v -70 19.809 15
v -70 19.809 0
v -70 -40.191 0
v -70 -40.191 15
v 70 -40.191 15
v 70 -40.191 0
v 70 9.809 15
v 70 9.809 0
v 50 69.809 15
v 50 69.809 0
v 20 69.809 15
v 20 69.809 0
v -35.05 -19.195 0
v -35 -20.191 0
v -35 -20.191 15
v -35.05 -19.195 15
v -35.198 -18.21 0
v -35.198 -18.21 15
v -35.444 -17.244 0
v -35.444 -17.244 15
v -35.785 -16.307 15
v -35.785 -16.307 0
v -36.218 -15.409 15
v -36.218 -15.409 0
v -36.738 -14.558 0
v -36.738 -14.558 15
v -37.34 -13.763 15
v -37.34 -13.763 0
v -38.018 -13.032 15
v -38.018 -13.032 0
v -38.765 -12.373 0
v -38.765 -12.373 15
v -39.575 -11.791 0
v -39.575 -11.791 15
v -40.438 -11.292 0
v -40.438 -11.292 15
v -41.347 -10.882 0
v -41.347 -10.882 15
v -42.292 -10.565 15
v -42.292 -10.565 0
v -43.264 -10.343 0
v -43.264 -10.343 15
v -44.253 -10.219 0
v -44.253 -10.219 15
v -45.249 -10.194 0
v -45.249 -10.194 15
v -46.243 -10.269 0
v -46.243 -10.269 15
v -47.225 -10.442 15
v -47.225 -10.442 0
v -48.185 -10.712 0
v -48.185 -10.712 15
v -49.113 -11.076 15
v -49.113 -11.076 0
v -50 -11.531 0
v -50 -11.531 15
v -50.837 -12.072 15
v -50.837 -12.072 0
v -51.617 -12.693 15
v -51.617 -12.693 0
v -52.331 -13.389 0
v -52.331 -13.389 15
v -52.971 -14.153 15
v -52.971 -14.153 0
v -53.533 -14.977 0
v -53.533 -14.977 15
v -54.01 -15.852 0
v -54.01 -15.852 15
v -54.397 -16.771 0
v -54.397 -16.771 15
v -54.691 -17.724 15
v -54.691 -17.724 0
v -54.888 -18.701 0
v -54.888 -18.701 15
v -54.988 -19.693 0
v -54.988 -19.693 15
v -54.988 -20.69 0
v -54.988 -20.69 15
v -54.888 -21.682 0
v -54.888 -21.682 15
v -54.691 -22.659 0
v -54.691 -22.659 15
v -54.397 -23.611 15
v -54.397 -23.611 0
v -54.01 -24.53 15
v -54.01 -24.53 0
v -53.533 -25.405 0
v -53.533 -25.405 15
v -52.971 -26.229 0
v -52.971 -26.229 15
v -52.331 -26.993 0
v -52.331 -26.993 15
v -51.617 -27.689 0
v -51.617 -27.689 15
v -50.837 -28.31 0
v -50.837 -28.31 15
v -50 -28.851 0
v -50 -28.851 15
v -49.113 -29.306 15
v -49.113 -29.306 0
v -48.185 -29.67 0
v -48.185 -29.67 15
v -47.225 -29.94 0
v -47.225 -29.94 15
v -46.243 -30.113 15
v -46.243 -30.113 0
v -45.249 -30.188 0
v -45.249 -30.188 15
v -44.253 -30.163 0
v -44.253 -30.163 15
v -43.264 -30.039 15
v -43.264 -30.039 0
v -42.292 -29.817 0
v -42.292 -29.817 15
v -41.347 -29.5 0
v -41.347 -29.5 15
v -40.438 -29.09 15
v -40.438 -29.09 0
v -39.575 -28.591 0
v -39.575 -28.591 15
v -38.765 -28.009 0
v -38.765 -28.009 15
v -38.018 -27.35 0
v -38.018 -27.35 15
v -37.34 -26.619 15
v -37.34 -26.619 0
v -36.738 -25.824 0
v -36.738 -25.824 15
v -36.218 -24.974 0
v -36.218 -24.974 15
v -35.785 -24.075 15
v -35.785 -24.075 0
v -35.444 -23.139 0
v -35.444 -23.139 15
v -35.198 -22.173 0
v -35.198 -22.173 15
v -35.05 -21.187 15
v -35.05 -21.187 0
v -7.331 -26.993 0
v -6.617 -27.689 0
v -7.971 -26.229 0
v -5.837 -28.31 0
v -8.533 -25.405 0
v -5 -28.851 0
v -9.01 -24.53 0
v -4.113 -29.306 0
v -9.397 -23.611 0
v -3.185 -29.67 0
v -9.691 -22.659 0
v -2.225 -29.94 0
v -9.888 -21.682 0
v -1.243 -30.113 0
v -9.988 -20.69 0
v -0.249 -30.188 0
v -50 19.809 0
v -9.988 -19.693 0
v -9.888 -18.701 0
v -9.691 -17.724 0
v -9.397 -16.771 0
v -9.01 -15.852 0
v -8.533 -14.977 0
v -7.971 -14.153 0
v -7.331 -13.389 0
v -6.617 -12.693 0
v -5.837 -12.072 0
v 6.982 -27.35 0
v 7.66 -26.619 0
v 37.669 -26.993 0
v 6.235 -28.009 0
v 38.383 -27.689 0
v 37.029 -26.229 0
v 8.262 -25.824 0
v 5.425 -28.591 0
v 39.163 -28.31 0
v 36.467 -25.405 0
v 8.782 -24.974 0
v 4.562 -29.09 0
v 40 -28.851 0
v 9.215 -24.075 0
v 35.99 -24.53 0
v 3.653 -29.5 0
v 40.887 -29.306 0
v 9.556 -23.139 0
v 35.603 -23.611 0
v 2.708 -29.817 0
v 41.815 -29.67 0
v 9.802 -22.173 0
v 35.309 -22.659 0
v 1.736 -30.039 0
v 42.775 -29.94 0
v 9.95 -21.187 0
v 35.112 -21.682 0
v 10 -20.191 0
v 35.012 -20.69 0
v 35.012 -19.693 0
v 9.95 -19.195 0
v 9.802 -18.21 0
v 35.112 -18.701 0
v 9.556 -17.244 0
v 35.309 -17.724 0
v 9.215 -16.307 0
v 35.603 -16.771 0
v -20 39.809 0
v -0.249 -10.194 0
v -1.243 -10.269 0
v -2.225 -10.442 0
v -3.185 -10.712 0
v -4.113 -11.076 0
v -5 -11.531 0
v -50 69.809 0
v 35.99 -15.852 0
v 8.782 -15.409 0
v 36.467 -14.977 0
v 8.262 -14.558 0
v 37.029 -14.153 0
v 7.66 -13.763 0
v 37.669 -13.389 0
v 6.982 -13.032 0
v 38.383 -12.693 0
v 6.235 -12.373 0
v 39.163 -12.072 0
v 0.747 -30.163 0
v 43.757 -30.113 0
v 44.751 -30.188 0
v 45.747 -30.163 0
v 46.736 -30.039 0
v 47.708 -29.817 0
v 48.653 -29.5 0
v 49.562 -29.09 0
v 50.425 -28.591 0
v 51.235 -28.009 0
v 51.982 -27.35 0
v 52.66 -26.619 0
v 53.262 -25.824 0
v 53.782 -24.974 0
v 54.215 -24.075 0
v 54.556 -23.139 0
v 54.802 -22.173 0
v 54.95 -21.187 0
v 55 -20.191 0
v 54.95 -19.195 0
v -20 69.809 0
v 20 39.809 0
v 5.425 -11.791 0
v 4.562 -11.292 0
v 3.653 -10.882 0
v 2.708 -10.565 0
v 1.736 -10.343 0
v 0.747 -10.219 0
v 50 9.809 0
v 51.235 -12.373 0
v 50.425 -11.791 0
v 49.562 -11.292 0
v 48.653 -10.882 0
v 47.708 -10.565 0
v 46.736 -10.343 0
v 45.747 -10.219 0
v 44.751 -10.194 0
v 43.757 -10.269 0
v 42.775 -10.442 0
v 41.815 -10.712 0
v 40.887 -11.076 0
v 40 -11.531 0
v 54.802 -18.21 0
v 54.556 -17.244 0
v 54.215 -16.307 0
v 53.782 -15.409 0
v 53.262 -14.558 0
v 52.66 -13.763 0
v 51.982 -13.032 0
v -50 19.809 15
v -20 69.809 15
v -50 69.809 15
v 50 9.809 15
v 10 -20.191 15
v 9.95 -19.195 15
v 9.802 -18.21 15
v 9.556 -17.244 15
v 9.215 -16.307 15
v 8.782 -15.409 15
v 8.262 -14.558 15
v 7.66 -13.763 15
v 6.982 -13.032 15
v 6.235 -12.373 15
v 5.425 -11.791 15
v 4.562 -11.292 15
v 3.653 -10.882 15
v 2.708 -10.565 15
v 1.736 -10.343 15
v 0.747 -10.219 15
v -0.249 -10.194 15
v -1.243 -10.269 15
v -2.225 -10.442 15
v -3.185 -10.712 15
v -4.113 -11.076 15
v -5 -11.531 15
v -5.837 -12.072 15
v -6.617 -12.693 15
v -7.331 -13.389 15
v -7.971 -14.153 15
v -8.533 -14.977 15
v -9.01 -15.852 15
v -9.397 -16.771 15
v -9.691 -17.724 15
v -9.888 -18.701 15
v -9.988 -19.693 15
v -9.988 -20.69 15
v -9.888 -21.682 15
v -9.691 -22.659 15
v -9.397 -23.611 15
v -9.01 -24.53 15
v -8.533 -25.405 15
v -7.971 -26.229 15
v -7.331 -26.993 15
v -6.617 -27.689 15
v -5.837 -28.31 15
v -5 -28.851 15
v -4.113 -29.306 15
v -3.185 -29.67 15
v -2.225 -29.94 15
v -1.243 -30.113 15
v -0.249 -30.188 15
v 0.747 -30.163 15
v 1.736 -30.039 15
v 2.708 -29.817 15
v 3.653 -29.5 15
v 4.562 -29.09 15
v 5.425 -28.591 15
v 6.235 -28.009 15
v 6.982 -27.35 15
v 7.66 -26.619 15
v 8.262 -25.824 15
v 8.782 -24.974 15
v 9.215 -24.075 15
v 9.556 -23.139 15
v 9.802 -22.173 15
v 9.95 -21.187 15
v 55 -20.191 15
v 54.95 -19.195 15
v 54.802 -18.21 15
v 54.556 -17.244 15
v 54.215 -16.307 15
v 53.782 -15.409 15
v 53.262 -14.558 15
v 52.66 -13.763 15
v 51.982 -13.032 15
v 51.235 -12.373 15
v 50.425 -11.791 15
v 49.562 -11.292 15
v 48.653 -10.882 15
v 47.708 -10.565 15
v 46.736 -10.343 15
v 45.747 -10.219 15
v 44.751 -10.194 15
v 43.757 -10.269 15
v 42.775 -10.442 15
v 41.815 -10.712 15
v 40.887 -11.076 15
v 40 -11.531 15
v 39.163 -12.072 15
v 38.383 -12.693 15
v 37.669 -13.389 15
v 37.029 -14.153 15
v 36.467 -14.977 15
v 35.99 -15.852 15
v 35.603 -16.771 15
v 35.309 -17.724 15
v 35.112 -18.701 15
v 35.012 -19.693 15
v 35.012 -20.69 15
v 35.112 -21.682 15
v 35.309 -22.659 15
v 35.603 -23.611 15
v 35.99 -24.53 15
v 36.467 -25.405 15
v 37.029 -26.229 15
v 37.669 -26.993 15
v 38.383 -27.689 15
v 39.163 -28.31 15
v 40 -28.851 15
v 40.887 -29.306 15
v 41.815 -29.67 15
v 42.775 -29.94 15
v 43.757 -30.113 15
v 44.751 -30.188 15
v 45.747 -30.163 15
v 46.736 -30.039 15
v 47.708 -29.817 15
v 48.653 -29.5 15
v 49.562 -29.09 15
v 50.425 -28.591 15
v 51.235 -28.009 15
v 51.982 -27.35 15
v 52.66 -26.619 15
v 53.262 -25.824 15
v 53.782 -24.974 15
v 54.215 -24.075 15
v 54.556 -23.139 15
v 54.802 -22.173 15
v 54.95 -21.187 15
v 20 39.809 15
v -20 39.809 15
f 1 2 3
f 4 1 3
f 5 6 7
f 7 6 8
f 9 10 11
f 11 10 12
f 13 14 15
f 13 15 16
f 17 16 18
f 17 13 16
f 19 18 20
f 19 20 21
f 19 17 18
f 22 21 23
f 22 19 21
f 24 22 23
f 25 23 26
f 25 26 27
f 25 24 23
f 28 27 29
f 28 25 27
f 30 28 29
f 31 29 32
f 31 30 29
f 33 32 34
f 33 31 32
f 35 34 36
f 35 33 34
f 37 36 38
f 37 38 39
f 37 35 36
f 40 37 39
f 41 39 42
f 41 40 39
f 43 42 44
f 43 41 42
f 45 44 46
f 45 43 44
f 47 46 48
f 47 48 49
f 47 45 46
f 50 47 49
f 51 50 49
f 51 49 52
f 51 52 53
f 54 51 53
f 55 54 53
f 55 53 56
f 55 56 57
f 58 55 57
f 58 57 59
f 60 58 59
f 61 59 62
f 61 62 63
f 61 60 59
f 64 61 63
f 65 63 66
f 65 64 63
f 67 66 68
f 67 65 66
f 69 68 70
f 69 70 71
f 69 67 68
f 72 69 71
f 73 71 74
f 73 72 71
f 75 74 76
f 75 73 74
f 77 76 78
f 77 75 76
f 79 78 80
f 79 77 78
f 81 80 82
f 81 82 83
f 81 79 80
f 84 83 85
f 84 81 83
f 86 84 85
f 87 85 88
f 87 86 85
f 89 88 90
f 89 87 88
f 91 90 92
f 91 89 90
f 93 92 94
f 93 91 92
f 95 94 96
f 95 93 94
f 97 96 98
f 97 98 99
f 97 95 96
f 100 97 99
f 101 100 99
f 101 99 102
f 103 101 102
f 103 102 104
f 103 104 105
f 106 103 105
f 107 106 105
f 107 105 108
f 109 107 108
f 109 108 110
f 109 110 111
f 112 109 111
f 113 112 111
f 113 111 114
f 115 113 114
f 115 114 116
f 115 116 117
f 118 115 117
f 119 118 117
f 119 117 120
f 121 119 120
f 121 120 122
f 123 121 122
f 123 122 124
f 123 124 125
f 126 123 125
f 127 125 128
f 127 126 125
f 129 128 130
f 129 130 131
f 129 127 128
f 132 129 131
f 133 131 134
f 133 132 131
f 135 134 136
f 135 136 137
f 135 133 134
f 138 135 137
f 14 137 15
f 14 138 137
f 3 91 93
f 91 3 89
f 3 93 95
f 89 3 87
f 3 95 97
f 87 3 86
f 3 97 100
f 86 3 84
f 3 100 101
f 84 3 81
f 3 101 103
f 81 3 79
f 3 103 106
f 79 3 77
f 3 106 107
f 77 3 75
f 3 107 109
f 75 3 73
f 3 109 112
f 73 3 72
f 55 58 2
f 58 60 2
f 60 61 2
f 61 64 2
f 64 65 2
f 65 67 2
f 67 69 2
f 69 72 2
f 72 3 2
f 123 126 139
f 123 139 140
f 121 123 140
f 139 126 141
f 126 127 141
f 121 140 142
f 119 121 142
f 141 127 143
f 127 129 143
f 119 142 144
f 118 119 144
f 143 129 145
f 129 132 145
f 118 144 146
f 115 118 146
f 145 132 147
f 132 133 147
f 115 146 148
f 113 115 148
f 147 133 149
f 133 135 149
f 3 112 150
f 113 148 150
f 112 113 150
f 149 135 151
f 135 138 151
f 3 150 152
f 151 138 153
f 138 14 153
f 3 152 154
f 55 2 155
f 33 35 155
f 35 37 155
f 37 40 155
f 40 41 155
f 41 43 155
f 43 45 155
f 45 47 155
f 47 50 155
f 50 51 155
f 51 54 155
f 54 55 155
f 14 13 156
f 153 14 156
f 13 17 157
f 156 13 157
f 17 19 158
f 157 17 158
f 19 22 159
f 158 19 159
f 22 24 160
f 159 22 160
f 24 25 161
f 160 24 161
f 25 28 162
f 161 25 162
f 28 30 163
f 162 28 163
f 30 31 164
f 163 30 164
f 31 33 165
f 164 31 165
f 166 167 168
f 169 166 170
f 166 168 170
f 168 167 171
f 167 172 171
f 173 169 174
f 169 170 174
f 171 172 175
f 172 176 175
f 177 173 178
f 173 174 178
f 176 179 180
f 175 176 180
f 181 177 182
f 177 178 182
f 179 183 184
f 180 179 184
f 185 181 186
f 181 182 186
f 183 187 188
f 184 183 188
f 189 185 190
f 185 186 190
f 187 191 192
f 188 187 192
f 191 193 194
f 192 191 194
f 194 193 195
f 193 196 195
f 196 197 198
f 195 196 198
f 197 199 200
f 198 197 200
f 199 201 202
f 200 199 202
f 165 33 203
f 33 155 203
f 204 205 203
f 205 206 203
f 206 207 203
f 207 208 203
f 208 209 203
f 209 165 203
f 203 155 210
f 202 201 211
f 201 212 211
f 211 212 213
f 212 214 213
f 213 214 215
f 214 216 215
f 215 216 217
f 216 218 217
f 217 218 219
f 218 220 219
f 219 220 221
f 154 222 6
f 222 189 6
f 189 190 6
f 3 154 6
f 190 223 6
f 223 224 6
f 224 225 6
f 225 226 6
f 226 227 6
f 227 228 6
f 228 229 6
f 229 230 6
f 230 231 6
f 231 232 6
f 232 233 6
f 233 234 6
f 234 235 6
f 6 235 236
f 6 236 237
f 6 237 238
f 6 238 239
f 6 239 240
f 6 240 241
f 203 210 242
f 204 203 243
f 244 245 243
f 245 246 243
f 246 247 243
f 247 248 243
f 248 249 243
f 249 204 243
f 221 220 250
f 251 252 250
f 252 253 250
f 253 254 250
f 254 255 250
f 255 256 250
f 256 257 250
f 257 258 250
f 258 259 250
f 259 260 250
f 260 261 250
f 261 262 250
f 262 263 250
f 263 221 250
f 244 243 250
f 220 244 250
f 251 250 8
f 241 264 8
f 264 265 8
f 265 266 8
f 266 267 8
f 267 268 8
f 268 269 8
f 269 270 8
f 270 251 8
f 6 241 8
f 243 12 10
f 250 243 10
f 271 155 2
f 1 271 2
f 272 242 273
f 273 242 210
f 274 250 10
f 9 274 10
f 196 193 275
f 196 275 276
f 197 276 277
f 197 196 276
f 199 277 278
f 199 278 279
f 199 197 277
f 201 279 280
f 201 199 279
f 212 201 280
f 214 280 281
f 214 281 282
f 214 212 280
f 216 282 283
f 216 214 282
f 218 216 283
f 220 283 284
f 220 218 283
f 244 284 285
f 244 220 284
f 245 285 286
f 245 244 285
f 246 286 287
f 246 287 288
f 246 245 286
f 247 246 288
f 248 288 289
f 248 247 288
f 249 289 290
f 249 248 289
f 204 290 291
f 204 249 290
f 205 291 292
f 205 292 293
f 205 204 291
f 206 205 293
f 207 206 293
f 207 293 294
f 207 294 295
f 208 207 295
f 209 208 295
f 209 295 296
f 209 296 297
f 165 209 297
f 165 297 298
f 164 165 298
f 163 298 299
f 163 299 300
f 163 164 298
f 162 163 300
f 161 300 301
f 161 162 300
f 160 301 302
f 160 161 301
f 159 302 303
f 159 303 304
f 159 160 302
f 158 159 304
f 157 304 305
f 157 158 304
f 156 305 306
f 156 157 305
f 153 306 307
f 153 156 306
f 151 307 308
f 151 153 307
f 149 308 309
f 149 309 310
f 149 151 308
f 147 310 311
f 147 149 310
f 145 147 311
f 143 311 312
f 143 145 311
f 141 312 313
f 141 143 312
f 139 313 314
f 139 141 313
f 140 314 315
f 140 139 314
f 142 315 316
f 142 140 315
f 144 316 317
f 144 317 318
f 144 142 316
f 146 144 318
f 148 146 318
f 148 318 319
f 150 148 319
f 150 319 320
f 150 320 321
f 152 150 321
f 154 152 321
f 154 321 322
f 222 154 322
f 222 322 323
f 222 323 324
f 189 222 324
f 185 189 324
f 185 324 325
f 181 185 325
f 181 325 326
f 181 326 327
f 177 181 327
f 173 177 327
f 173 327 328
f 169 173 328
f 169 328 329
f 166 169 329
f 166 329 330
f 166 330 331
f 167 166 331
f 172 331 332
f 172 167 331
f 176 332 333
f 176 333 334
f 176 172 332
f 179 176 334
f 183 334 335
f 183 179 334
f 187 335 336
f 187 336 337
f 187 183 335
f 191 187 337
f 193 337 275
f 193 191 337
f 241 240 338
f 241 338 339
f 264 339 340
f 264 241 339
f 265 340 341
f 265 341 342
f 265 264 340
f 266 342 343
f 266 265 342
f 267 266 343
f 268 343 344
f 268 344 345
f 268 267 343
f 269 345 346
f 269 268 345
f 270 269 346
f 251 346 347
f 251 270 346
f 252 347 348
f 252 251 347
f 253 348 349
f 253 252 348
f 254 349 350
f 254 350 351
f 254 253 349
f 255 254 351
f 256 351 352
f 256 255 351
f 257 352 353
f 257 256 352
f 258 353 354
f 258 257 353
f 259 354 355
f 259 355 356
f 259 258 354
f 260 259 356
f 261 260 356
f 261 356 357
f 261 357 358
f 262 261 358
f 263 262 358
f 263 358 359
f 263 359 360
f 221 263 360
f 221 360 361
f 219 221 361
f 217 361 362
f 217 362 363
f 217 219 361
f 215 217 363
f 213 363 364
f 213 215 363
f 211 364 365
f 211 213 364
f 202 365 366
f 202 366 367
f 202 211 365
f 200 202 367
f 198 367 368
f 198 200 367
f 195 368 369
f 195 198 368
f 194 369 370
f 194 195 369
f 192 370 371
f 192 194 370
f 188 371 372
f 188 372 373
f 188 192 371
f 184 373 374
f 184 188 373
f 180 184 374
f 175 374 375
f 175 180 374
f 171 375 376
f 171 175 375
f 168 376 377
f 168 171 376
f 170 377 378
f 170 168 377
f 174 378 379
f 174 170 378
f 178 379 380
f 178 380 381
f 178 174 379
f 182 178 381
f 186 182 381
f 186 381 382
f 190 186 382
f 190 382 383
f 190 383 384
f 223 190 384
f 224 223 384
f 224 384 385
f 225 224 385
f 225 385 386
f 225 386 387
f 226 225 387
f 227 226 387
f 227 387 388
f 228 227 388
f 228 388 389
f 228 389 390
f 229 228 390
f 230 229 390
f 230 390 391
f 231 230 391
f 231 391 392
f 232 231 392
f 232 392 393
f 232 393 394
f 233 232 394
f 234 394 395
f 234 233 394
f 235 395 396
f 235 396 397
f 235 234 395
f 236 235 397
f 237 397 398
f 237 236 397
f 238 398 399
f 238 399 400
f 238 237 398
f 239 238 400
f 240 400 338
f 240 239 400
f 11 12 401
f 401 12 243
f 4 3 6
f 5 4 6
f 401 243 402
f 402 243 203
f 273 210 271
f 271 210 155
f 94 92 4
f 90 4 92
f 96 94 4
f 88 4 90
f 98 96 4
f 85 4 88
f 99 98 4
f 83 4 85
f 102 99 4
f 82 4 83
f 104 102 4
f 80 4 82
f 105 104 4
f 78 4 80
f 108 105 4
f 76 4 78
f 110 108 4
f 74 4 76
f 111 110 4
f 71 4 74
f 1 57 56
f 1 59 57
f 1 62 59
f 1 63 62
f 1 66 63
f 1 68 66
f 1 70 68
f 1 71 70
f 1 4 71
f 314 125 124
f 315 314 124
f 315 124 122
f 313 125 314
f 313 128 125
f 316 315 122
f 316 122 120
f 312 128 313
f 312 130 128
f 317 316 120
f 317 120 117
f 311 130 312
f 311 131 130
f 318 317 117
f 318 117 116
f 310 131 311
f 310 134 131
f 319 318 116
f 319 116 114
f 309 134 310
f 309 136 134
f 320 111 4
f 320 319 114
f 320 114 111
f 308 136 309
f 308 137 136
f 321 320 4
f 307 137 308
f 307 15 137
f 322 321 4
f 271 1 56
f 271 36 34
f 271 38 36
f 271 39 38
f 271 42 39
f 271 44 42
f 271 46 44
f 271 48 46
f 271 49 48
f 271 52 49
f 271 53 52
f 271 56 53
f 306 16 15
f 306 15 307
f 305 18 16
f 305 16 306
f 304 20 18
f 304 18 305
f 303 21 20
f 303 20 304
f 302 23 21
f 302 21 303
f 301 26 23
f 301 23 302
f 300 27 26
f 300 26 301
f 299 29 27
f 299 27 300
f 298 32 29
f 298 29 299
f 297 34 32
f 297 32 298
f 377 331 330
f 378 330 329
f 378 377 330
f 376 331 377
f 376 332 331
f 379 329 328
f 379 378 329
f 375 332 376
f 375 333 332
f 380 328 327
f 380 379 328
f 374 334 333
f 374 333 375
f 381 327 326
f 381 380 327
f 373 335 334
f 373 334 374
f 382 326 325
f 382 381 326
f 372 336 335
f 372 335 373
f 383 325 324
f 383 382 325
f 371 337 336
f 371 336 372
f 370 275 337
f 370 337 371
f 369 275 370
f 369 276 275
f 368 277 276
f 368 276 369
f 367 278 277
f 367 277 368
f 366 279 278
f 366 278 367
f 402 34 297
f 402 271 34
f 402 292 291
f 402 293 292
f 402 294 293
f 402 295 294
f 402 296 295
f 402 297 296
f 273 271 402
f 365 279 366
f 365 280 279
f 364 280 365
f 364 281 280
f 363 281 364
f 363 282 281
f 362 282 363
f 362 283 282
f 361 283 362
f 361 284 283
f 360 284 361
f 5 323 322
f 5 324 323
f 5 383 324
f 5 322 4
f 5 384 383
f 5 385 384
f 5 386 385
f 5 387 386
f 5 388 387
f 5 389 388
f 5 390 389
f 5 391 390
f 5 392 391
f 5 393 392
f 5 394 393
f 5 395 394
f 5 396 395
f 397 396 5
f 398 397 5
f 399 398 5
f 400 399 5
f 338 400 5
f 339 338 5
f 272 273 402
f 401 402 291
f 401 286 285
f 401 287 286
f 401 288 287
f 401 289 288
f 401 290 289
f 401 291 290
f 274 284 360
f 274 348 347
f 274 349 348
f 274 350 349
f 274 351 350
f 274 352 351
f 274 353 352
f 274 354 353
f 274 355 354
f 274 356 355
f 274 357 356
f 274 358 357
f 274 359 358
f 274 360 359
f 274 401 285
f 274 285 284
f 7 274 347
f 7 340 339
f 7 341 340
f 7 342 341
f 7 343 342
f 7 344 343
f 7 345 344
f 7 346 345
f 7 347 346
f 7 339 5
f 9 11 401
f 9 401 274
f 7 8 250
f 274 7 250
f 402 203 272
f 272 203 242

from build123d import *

# Parameters (mm, degrees)
SKETCH1_R           = 10
BOSS_EXTRUDE1_DEPTH = 15


with BuildPart() as part:
    # Sketch1 (on Front Plane) → Boss-Extrude1 (new body)
    with BuildSketch(Plane.XY):
        Polygon((-70, 19.808892587), (-70, -40.191107413), (70, -40.191107413), (70, 9.808892587), (50, 9.808892587), (50, 69.808892587), (20, 69.808892587), (20, 39.808892587), (-20, 39.808892587), (-20, 69.808892587), (-50, 69.808892587), (-50, 19.808892587), align=None)
        with Locations((-45, -20.191107413)):
            Circle(SKETCH1_R, mode=Mode.SUBTRACT)
        with Locations((0, -20.191107413)):
            Circle(SKETCH1_R, mode=Mode.SUBTRACT)
        with Locations((45, -20.191107413)):
            Circle(SKETCH1_R, mode=Mode.SUBTRACT)
    extrude(amount=BOSS_EXTRUDE1_DEPTH)


solid = part.part
